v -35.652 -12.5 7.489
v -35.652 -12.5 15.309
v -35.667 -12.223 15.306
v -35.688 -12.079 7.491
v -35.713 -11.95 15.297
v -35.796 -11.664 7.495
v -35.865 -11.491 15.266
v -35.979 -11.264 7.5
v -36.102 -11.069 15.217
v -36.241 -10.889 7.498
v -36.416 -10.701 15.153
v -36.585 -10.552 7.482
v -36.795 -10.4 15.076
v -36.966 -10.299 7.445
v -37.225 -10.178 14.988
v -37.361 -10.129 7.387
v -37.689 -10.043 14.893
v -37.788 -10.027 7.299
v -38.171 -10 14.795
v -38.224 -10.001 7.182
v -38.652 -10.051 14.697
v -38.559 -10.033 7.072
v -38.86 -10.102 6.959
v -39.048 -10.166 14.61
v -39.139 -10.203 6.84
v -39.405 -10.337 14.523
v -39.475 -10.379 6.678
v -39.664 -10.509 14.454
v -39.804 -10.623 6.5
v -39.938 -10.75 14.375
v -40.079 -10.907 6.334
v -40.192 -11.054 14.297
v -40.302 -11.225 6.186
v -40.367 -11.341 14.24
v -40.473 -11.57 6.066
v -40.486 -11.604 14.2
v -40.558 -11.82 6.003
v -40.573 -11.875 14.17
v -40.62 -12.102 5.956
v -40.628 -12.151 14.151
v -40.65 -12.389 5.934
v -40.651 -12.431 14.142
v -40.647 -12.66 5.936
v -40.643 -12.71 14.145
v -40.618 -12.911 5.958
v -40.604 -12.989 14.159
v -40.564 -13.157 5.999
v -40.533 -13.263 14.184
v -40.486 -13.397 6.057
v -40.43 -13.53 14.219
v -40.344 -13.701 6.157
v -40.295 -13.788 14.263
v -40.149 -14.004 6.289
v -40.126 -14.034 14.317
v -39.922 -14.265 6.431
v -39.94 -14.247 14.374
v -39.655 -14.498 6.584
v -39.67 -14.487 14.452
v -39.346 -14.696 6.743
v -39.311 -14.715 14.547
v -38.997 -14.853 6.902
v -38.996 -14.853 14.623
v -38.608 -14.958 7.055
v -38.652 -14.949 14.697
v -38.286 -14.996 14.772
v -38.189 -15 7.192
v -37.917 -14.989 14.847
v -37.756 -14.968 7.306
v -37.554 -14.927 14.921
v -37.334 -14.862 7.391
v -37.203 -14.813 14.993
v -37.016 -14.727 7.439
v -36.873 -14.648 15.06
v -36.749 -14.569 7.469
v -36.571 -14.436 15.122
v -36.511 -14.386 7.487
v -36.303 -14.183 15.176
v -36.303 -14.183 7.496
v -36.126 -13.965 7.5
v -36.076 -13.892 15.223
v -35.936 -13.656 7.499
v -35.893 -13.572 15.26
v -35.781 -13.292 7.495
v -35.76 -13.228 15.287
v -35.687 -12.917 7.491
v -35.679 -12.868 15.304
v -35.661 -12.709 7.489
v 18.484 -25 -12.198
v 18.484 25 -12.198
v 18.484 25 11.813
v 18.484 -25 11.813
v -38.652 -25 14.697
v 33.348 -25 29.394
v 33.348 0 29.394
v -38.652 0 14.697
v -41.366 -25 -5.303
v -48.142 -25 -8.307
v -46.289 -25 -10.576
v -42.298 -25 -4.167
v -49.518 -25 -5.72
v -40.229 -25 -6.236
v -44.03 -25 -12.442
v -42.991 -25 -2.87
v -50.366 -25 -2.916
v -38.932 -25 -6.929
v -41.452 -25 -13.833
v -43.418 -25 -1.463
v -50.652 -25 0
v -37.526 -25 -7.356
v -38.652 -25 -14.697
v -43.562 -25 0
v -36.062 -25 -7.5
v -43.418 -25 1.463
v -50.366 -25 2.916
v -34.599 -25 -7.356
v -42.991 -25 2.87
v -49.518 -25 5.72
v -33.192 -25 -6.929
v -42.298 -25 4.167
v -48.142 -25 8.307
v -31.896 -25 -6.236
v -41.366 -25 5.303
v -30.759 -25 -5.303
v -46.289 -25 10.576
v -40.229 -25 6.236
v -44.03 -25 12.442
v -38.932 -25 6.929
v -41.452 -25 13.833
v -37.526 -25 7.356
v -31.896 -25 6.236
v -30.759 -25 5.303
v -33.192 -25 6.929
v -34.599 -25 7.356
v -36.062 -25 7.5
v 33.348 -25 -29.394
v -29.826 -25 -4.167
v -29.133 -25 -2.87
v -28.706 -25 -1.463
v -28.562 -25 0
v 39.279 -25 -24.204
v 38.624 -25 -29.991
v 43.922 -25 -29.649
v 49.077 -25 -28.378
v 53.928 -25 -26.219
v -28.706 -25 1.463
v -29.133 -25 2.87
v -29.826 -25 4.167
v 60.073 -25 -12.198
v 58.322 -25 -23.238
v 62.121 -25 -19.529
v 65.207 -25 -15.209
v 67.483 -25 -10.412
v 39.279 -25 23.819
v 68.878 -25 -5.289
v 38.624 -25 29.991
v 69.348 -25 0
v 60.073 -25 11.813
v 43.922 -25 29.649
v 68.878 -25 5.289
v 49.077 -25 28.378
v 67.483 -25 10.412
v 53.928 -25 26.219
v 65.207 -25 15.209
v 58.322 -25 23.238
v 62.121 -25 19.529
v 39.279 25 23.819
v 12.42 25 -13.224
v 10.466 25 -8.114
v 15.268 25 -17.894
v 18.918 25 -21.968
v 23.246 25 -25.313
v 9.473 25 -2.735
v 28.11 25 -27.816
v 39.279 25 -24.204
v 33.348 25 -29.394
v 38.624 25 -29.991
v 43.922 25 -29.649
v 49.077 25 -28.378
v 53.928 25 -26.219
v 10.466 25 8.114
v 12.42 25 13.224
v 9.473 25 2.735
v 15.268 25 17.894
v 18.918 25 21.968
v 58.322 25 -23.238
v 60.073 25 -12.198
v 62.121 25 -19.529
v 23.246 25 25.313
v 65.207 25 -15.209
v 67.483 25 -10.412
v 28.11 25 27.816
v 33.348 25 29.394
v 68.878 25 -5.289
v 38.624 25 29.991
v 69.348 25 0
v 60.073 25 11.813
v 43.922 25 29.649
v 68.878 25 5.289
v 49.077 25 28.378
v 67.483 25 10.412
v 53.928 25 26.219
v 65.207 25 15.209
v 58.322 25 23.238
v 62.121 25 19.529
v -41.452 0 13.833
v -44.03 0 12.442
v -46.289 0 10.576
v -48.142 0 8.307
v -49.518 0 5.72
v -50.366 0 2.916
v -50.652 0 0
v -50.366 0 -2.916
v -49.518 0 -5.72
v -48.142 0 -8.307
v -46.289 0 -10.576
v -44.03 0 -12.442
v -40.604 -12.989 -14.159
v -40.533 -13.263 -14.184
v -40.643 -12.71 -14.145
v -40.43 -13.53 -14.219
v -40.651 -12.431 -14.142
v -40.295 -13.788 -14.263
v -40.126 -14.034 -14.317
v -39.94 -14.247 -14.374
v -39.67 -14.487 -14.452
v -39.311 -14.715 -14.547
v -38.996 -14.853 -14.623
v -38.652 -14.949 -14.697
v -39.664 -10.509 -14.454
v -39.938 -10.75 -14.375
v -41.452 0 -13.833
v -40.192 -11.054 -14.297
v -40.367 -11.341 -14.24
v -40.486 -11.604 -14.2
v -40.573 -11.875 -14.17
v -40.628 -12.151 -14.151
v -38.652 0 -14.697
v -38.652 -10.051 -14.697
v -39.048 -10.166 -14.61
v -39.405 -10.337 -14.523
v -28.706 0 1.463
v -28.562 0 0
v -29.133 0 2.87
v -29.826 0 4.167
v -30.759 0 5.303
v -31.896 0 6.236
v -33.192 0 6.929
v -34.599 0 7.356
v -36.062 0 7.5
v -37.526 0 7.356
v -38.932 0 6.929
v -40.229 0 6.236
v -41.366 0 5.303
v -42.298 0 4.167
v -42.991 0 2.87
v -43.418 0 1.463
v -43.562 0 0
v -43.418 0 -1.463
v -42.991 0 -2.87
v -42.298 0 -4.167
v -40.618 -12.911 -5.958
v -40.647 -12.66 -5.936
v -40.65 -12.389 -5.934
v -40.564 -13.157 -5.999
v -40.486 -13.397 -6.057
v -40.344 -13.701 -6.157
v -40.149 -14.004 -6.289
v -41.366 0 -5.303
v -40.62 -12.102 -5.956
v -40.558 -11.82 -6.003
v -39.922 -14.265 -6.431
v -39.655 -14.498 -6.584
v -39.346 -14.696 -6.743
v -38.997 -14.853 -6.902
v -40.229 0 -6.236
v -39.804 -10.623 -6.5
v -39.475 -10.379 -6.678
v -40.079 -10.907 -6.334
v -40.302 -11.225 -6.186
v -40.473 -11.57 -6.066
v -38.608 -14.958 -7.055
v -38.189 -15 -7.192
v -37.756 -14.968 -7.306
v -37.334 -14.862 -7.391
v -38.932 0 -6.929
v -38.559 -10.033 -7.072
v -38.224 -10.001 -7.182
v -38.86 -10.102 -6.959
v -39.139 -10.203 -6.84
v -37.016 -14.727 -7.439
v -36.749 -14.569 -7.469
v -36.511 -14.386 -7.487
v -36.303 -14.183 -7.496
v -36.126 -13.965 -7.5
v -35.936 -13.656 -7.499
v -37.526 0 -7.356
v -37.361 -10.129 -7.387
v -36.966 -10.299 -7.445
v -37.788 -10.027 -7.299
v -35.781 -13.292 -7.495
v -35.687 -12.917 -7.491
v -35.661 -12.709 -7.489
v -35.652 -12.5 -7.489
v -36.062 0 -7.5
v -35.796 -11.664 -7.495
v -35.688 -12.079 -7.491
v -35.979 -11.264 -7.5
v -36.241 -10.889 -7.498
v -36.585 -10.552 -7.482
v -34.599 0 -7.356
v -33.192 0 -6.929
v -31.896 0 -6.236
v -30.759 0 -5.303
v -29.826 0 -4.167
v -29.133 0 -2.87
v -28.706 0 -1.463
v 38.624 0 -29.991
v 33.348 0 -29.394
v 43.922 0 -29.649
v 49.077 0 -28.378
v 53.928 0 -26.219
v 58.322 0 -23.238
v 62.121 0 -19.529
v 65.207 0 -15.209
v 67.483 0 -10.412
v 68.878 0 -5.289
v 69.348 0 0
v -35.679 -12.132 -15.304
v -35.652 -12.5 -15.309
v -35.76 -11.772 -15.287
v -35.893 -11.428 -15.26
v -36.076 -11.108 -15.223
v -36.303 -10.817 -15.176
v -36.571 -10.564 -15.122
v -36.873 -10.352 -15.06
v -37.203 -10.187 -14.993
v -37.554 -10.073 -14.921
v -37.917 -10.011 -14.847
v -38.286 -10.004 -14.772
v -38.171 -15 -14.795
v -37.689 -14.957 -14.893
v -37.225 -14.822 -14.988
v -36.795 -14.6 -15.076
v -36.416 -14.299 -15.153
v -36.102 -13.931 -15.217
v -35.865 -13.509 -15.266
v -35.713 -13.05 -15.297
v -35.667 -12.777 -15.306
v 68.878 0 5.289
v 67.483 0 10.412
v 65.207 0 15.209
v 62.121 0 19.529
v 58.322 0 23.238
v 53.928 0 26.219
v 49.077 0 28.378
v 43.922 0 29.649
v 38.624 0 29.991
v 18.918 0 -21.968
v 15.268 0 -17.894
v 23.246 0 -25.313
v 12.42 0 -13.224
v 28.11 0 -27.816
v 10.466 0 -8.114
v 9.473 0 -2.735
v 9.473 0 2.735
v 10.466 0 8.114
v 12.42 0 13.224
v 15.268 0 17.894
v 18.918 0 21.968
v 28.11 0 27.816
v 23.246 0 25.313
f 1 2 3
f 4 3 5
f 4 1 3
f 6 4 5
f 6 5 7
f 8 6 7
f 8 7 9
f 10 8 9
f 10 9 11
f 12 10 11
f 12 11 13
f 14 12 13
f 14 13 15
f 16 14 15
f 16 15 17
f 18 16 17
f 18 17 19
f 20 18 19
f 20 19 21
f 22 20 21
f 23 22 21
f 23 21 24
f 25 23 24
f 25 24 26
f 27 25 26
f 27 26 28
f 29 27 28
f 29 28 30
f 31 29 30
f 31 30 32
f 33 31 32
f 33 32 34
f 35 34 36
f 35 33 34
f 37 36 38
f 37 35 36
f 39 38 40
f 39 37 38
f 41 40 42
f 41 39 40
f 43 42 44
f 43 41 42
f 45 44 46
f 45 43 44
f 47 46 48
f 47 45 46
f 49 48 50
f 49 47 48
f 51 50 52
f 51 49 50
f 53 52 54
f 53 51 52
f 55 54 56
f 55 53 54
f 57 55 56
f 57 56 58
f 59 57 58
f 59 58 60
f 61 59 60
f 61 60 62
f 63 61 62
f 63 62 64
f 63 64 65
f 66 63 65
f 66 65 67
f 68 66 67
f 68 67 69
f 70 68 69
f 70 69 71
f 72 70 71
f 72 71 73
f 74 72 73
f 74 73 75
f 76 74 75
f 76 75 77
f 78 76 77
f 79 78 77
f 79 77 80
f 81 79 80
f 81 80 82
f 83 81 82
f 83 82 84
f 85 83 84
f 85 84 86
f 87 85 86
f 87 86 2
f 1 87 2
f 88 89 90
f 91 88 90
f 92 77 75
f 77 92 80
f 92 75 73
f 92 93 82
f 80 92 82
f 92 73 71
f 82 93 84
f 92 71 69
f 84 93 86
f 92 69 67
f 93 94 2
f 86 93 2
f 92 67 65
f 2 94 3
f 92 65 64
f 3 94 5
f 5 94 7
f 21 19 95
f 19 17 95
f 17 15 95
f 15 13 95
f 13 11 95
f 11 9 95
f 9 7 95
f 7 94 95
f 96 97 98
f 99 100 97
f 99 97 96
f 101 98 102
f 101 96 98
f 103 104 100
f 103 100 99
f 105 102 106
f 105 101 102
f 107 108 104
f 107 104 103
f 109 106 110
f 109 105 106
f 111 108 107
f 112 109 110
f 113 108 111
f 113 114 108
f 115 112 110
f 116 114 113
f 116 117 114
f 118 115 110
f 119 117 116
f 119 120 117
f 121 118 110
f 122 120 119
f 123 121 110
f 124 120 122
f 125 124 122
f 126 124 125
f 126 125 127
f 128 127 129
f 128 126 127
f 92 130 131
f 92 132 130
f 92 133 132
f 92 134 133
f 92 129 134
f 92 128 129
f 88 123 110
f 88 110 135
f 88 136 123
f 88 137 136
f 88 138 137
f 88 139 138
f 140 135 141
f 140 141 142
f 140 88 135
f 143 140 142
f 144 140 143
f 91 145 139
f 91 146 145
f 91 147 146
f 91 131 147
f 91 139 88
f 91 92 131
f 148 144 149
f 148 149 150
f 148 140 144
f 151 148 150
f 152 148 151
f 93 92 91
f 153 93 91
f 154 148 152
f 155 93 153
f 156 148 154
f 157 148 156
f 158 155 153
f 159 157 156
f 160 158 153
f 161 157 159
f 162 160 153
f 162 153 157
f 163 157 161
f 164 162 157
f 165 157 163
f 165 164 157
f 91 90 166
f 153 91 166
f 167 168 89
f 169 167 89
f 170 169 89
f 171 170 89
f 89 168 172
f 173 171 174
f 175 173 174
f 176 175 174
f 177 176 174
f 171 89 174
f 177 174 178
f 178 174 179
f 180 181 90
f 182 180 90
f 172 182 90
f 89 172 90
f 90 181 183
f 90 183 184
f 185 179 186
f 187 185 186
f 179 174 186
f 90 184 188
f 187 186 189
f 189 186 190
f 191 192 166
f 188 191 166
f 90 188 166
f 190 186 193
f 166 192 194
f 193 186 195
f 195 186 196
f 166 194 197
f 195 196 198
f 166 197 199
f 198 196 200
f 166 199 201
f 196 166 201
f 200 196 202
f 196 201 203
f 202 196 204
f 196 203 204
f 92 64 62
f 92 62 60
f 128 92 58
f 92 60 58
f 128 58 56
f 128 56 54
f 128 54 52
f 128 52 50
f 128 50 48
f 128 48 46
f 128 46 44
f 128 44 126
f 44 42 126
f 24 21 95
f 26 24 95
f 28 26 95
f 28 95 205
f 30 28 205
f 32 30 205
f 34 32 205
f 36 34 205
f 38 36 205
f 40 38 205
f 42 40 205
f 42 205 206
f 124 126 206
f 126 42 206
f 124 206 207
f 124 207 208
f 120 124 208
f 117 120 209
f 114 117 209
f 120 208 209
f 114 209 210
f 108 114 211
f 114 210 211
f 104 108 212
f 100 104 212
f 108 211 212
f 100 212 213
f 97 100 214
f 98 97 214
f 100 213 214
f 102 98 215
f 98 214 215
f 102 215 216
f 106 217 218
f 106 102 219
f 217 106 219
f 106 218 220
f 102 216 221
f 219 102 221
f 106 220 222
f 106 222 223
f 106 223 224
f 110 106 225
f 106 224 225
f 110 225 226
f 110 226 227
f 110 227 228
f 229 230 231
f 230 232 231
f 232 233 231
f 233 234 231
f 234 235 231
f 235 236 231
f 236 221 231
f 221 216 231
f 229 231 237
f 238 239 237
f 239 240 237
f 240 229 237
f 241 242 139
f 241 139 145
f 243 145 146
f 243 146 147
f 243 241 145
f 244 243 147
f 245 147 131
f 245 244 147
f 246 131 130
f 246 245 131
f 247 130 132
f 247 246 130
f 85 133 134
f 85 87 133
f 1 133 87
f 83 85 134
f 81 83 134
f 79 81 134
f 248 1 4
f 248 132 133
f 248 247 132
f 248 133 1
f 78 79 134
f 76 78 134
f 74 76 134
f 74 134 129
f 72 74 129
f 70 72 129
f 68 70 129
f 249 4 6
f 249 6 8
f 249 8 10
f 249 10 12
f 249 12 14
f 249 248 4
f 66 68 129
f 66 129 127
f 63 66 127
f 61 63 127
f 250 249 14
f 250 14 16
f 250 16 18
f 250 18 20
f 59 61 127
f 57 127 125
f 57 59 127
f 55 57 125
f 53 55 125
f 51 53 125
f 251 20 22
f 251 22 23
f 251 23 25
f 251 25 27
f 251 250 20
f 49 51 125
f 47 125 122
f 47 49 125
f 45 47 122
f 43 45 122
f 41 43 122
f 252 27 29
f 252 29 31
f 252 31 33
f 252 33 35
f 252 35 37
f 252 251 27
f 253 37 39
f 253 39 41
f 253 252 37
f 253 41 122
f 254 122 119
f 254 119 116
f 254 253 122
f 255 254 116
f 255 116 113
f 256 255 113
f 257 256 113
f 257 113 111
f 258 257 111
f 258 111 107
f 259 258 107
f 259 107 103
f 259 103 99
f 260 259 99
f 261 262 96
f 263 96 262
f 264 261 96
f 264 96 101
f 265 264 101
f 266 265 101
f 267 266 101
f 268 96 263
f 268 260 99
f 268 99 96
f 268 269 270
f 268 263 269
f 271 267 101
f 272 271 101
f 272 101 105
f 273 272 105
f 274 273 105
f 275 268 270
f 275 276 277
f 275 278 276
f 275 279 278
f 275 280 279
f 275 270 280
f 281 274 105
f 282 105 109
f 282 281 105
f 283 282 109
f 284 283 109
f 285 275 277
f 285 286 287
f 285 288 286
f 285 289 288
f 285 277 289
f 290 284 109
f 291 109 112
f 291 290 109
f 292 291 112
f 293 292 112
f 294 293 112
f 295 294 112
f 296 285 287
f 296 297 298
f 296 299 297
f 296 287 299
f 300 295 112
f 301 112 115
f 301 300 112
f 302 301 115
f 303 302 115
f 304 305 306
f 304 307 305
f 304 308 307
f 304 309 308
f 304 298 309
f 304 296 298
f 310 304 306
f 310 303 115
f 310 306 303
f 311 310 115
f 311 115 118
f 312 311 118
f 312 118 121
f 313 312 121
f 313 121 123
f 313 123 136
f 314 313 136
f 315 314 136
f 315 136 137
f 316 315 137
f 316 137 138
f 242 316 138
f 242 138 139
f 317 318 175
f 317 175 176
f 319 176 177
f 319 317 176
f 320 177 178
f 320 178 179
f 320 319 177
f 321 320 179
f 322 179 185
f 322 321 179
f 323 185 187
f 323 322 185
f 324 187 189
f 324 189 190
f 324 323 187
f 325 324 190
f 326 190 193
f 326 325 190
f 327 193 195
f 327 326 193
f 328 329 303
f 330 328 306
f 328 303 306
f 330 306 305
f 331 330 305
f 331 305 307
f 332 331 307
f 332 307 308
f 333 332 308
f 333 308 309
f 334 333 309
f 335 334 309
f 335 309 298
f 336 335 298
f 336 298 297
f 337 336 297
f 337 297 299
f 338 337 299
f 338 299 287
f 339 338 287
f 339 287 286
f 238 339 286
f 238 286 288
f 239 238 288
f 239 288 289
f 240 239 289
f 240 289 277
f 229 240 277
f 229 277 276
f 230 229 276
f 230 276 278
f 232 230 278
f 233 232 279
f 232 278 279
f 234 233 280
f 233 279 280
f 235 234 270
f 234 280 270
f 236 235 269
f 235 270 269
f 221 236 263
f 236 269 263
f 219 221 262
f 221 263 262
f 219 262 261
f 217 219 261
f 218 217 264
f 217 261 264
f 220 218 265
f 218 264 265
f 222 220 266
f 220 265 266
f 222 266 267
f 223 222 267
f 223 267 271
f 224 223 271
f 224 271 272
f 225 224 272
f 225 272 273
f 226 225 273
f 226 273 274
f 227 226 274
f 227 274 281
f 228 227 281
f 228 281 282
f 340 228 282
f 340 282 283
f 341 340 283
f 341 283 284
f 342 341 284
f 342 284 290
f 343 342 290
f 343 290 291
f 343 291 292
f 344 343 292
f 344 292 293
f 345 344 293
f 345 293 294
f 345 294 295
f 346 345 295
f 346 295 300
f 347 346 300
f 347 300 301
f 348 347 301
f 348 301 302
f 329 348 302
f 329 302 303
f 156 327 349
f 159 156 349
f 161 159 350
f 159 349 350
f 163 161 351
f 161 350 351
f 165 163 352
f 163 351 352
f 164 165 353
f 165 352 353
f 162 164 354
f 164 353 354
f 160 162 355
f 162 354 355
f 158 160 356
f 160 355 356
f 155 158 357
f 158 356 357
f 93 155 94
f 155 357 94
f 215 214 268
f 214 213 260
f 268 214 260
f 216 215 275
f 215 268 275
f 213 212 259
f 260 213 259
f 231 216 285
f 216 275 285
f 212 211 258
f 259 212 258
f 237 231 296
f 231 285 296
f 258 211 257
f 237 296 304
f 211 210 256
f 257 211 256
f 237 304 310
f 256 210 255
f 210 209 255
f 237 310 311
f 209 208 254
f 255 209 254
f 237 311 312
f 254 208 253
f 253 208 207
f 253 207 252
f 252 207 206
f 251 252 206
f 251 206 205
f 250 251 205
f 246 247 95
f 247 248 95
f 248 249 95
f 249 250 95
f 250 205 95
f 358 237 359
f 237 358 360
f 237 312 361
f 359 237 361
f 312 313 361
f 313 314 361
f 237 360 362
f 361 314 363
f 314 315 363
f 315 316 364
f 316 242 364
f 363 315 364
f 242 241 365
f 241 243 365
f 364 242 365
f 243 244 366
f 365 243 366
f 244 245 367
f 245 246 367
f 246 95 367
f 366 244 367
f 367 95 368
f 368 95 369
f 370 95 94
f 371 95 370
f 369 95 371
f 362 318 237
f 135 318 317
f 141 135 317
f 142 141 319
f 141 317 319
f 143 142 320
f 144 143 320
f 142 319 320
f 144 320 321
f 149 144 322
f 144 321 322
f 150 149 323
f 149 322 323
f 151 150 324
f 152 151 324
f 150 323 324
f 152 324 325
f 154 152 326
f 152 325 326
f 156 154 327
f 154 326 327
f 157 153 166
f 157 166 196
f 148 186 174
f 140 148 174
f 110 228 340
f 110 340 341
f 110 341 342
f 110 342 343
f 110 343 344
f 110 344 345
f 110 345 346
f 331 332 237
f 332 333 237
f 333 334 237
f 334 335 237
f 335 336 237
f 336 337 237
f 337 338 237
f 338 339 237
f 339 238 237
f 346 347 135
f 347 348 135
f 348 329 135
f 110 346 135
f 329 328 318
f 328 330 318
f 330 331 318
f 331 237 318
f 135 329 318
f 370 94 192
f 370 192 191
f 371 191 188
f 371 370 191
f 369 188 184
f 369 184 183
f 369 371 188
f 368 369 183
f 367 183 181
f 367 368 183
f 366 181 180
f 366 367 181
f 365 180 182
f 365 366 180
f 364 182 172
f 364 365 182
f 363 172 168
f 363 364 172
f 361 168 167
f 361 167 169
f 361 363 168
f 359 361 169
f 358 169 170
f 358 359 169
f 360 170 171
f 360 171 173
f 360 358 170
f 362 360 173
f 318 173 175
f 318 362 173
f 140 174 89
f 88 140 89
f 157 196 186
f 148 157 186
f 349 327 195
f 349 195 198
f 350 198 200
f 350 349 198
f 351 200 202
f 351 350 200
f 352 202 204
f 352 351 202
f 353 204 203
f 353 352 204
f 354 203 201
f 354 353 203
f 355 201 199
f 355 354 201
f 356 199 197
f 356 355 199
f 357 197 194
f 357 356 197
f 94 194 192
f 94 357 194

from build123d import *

# Parameters (mm, degrees)
F1_DEPTH       = 25
F2_DEPTH       = 25
F3_DEPTH       = 25
F5_START       = -25
F5_DEPTH       = 25.001
F6_DEPTH       = 25
F7_DEPTH       = 50.001
F8_R           = 7.5
F9_DEPTH       = 25
F10_R          = 2.5
F11_DEPTH      = 25
F11_DEPTH_BACK = 25


with BuildPart() as f1:
    # F0 (on Front) → F1 (new body)
    with BuildSketch(Plane.XZ):
        with BuildLine():
            ThreePointArc((-38.6520479365, -14.6969384567), (-26.165214956, -11.6189500386), (-20.6520479365, 0))
            ThreePointArc((-20.6520479365, 0), (-26.165214956, 11.6189500386), (-38.6520479365, 14.6969384567))
            ThreePointArc((-38.6520479365, 14.6969384567), (-50.6520479365, 0), (-38.6520479365, -14.6969384567))
        make_face()
        with BuildLine():
            ThreePointArc((-38.6520479365, 14.6969384567), (-26.165214956, 11.6189500386), (-20.6520479365, 0))
            ThreePointArc((-20.6520479365, 0), (-26.165214956, -11.6189500386), (-38.6520479365, -14.6969384567))
            Line((-38.6520479365, -14.6969384567), (33.3479520635, -29.3938769134))
            ThreePointArc((33.3479520635, -29.3938769134), (9.3479520635, 0), (33.3479520635, 29.3938769134))
            Line((33.3479520635, 29.3938769134), (-38.6520479365, 14.6969384567))
        make_face()
        with BuildLine():
            ThreePointArc((69.3479520635, 0), (58.3216180245, 23.2379000772), (33.3479520635, 29.3938769134))
            ThreePointArc((33.3479520635, 29.3938769134), (9.3479520635, 0), (33.3479520635, -29.3938769134))
            ThreePointArc((33.3479520635, -29.3938769134), (58.3216180245, -23.2379000772), (69.3479520635, 0))
        make_face()
    extrude(amount=F1_DEPTH)

    # F0 (on Front) → F2 (join)
    with BuildSketch(Plane.XZ):
        with BuildLine():
            ThreePointArc((69.3479520635, 0), (58.3216180245, 23.2379000772), (33.3479520635, 29.3938769134))
            ThreePointArc((33.3479520635, 29.3938769134), (9.3479520635, 0), (33.3479520635, -29.3938769134))
            ThreePointArc((33.3479520635, -29.3938769134), (58.3216180245, -23.2379000772), (69.3479520635, 0))
        make_face()
    extrude(amount=F2_DEPTH)

    # F0 (on Front) → F3 (join)
    with BuildSketch(Plane.XZ):
        with BuildLine():
            ThreePointArc((69.3479520635, 0), (58.3216180245, 23.2379000772), (33.3479520635, 29.3938769134))
            ThreePointArc((33.3479520635, 29.3938769134), (9.3479520635, 0), (33.3479520635, -29.3938769134))
            ThreePointArc((33.3479520635, -29.3938769134), (58.3216180245, -23.2379000772), (69.3479520635, 0))
        make_face()
    extrude(amount=-F3_DEPTH)

    # F1_face (on face) → F5 (cut)
    with BuildSketch(Plane(origin=(15.2359623928, -25, 0), x_dir=(1, 0, 0), z_dir=(0, -1, 0)).offset(F5_START)):
        with BuildLine():
            Line((18.1119896706, 29.3938769134), (-53.8880103294, 14.6969384567))
            ThreePointArc((-53.8880103294, 14.6969384567), (-65.8880103294, 0), (-53.8880103294, -14.6969384567))
            Line((-53.8880103294, -14.6969384567), (18.1119896706, -29.3938769134))
            ThreePointArc((18.1119896706, -29.3938769134), (54.1119896706, 0), (18.1119896706, 29.3938769134))
        make_face()
    extrude(amount=-F5_DEPTH, mode=Mode.SUBTRACT)

    # F0 (on Front) → F6 (join)
    with BuildSketch(Plane.XZ):
        with BuildLine():
            ThreePointArc((69.3479520635, 0), (58.3216180245, 23.2379000772), (33.3479520635, 29.3938769134))
            ThreePointArc((33.3479520635, 29.3938769134), (9.3479520635, 0), (33.3479520635, -29.3938769134))
            ThreePointArc((33.3479520635, -29.3938769134), (58.3216180245, -23.2379000772), (69.3479520635, 0))
        make_face()
    extrude(amount=-F6_DEPTH)

    # F4 (on face) → F7 (cut, through all)
    with BuildSketch(Plane(origin=(0, 25, 0), x_dir=(-1, 0, 0), z_dir=(0, 1, 0))):
        Polygon((-18.48410815, -12.1983237636), (-18.48410815, 11.8132381481), (-39.2787307501, 23.8190191039), (-60.0733533502, 11.8132381481), (-60.0733533502, -12.1983237636), (-39.2787307501, -24.2041047195), align=None)
    extrude(amount=-F7_DEPTH, mode=Mode.SUBTRACT)

    # F8 (on face) → F9 (cut)
    with BuildSketch(Plane.XZ):
        with Locations((-36.0623635352, 0)):
            Circle(F8_R)
    extrude(amount=F9_DEPTH, mode=Mode.SUBTRACT)

    # F10 (on Top) → F11 (cut, two sides)
    with BuildSketch(Plane.XY) as f11_sk:
        with Locations((-38.1520479365, -12.5)):
            Circle(F10_R)
    extrude(amount=-F11_DEPTH, mode=Mode.SUBTRACT)
    extrude(f11_sk.sketch, amount=F11_DEPTH_BACK, mode=Mode.SUBTRACT)


solid = f1.part
